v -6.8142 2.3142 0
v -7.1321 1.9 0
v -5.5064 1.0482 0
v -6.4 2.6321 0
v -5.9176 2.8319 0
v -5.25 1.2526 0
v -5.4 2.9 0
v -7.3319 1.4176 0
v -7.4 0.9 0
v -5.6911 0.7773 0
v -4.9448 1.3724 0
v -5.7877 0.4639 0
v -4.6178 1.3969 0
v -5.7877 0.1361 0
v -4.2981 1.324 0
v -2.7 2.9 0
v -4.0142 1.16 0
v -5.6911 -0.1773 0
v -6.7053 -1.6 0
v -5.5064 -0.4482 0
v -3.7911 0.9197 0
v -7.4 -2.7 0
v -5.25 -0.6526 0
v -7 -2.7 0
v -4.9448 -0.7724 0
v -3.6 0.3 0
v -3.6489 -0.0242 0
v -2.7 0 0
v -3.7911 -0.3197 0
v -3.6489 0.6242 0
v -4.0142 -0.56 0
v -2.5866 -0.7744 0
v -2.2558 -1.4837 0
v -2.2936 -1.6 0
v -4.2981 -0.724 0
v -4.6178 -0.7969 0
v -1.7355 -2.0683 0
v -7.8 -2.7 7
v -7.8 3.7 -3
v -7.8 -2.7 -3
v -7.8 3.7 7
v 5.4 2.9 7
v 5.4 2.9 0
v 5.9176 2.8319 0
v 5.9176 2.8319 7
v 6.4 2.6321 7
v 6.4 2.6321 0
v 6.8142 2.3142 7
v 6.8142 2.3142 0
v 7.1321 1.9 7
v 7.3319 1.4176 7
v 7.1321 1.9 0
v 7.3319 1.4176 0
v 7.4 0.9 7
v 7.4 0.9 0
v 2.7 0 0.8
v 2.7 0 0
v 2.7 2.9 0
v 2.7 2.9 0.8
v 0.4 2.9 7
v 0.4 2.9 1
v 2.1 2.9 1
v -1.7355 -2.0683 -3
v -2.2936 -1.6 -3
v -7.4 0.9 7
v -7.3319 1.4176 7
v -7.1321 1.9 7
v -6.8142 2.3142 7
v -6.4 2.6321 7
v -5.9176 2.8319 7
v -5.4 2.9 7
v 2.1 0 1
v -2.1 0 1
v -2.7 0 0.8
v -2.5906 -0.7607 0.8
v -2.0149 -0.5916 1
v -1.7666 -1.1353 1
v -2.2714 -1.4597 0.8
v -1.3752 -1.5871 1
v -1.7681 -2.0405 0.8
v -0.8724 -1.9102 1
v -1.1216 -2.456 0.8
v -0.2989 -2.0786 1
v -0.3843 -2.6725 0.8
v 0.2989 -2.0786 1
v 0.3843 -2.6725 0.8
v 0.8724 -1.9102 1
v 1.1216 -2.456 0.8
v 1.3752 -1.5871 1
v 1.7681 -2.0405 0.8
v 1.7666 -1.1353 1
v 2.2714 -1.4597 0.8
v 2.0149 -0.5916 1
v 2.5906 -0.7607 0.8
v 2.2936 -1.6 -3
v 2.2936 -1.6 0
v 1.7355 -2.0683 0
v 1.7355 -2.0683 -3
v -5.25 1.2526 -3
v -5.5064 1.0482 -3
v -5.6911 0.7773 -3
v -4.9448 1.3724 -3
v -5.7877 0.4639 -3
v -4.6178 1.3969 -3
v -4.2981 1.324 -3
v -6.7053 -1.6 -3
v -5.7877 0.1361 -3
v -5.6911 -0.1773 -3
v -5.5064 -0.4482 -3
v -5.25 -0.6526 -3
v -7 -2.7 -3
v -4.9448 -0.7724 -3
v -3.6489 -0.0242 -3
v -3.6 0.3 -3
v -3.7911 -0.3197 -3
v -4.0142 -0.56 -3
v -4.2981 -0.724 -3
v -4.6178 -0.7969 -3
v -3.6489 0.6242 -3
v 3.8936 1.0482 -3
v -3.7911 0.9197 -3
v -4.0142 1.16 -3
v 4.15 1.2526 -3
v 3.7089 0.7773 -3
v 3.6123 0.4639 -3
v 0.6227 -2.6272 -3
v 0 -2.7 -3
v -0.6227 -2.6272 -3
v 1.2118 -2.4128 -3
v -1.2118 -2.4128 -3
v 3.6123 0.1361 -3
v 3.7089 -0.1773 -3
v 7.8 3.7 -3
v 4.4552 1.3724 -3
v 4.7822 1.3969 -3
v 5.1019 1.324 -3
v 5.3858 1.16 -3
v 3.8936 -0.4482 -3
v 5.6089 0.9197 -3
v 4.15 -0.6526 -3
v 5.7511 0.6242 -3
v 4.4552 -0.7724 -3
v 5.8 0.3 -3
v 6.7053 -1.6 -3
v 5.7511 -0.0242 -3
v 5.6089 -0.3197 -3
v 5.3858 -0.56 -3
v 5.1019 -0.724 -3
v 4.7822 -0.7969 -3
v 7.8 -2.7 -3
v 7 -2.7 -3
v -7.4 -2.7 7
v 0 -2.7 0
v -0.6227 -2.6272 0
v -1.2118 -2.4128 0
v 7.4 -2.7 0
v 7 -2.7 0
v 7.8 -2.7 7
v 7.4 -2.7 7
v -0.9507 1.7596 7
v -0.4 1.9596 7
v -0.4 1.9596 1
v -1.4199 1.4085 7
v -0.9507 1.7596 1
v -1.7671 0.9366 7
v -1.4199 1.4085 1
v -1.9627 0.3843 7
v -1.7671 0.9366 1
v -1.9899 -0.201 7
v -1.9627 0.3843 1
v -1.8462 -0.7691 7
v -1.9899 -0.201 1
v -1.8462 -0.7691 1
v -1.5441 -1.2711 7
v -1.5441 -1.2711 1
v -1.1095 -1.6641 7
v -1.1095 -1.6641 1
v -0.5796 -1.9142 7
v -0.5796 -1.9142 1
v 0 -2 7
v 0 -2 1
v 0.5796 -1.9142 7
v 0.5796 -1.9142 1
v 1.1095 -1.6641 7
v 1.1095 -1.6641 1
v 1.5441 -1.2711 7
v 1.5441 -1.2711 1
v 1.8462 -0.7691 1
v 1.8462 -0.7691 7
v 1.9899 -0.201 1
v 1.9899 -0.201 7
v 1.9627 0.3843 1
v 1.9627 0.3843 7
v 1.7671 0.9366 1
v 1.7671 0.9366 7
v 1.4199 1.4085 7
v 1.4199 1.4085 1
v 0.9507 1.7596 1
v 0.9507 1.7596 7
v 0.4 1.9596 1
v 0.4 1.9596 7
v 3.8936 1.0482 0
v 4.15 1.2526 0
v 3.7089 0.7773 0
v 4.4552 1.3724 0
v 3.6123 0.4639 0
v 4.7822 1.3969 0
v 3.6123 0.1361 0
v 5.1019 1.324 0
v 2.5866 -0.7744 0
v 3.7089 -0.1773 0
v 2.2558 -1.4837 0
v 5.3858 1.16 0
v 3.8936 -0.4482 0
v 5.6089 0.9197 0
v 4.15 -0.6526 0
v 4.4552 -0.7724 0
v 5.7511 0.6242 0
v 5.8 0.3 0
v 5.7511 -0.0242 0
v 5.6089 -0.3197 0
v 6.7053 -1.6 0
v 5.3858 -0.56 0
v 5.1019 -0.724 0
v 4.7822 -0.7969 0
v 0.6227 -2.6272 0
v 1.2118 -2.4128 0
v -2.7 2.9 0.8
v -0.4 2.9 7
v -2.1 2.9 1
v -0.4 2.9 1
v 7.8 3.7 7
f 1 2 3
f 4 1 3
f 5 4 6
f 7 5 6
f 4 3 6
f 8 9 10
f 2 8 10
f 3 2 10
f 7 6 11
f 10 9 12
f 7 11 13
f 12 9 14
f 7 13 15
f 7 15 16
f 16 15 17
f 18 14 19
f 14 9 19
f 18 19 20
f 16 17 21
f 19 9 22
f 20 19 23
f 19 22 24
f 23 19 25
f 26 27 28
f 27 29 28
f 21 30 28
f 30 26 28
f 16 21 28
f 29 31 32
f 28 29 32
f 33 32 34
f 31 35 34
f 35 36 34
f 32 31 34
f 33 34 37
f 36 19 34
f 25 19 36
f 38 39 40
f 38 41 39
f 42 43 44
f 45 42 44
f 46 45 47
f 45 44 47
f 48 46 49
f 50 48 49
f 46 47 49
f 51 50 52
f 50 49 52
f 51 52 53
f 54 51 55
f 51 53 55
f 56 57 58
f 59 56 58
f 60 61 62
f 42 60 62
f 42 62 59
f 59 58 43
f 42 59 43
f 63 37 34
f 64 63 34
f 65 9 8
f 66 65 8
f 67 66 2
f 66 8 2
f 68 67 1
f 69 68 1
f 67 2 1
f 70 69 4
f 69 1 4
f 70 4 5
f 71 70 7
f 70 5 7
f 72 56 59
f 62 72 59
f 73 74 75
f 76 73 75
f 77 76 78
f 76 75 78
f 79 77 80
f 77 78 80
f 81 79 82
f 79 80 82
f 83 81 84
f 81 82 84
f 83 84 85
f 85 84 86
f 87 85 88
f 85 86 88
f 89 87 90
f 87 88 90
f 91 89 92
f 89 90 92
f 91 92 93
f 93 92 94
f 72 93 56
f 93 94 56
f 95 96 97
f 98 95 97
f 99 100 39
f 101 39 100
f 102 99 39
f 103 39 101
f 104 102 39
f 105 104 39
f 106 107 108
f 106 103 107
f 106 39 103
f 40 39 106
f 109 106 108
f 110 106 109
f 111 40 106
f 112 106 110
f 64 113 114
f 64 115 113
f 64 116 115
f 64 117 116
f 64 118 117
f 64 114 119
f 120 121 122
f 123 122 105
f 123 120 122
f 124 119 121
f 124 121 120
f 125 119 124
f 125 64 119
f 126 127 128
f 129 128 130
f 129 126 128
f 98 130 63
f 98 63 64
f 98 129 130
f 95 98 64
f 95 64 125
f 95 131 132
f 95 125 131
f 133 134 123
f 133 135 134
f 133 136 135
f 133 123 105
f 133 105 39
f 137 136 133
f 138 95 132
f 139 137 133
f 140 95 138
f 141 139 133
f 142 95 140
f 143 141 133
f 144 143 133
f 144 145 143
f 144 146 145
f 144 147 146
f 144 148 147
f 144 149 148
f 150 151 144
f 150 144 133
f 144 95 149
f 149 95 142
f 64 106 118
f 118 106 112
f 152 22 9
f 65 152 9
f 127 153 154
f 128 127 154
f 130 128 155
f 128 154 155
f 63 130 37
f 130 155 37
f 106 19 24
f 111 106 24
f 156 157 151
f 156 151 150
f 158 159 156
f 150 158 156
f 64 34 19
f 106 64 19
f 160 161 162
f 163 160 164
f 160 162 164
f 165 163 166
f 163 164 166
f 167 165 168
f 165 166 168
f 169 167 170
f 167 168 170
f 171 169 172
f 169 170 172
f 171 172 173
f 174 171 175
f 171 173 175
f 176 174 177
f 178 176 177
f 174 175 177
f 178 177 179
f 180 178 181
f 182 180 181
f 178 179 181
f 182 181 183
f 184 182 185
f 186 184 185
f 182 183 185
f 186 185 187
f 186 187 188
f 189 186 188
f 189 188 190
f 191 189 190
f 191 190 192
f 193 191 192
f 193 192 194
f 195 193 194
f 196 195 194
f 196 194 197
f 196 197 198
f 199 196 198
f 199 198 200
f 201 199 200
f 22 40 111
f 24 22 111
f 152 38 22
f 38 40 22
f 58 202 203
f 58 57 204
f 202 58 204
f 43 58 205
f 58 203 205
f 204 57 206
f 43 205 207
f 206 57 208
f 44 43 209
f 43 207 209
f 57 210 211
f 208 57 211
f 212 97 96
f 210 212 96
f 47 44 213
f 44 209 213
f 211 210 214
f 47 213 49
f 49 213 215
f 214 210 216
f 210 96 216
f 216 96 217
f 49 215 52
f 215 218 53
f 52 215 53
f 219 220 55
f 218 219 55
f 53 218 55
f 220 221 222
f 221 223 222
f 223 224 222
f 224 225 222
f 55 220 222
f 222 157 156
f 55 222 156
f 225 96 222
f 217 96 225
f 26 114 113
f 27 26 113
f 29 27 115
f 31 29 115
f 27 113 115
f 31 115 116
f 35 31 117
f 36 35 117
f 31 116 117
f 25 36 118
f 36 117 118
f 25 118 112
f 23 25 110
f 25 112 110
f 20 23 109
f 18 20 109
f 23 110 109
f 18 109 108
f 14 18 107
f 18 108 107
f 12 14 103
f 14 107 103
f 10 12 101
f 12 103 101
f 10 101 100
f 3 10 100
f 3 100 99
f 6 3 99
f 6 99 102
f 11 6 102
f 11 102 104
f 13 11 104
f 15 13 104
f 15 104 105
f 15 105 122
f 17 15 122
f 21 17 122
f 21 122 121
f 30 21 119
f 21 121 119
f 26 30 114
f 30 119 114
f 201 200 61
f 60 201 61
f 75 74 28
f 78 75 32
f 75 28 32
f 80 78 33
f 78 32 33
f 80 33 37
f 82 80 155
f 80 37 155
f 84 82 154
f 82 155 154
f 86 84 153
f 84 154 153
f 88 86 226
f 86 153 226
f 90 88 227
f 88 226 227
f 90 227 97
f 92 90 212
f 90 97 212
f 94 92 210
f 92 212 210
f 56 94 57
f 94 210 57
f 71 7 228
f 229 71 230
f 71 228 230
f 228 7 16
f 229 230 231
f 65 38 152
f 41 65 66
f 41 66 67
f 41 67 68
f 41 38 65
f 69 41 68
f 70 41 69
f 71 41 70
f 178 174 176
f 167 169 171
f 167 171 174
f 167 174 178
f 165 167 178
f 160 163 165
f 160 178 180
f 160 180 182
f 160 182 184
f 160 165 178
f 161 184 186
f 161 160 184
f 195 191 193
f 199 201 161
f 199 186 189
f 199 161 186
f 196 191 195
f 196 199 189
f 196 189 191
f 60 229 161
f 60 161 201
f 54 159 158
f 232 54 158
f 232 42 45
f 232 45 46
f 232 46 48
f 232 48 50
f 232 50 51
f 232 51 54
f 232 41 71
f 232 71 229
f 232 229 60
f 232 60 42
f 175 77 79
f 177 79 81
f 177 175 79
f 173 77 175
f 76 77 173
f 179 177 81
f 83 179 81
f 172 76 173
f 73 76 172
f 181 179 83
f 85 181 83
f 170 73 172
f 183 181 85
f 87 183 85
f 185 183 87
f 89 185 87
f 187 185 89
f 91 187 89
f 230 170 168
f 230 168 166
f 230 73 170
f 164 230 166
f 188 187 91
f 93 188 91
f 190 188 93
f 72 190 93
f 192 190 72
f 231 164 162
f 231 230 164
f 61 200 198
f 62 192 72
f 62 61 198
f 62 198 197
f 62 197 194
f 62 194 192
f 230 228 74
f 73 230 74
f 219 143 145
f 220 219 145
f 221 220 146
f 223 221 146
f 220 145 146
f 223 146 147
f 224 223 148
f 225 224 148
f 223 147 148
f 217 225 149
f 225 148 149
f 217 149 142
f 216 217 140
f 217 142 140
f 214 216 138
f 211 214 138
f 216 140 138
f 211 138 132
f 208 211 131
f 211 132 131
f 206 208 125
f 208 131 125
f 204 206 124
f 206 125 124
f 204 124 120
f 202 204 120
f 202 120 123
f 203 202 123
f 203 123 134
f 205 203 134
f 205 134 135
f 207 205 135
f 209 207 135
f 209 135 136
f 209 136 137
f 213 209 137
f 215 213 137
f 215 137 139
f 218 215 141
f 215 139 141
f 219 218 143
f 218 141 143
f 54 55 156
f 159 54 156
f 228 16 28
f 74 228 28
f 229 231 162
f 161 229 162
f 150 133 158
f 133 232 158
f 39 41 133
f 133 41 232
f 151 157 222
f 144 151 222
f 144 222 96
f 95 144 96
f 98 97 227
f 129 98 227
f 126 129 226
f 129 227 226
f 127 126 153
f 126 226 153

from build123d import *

# Parameters (mm, degrees)
F1_DEPTH  = 7
F2_W      = 15.6
F2_H      = 6.4
F3_DEPTH  = 3
F5_DEPTH  = 1
F6_SIZE2  = 0.2
F6_SIZE   = 0.6
F8_DEPTH  = 3
F9_R      = 1.1
F10_DEPTH = 3


with BuildPart() as f1:
    # F0 (on Top) → F1 (new body)
    with BuildSketch(Plane.XY):
        with BuildLine():
            Line((-0.4, 2.9), (-0.4, 1.9595917942))
            ThreePointArc((-0.4, 1.9595917942), (0, -2), (0.4, 1.9595917942))
            Line((0.4, 1.9595917942), (0.4, 2.9))
            Line((0.4, 2.9), (5.4, 2.9))
            ThreePointArc((5.4, 2.9), (6.8142135624, 2.3142135624), (7.4, 0.9))
            Line((7.4, 0.9), (7.4, -2.7))
            Line((7.4, -2.7), (7.8, -2.7))
            Line((7.8, -2.7), (7.8, 3.7))
            Line((7.8, 3.7), (-7.8, 3.7))
            Line((-7.8, 3.7), (-7.8, -2.7))
            Line((-7.8, -2.7), (-7.4, -2.7))
            Line((-7.4, -2.7), (-7.4, 0.9))
            ThreePointArc((-7.4, 0.9), (-6.8142135624, 2.3142135624), (-5.4, 2.9))
            Line((-5.4, 2.9), (-0.4, 2.9))
        make_face()
    extrude(amount=F1_DEPTH)

    # F2 (on face) → F3 (join)
    with BuildSketch(Plane(origin=(0, 0, 0), x_dir=(1, 0, 0), z_dir=(0, 0, -1))):
        with Locations((0, -0.5)):
            Rectangle(F2_W, F2_H)
    extrude(amount=F3_DEPTH)

    # F4 (on face) → F5 (join)
    with BuildSketch(Plane.XY):
        with BuildLine():
            Line((-2.7, 2.9), (-2.7, 0))
            ThreePointArc((-2.7, 0), (0, -2.7), (2.7, 0))
            Line((2.7, 0), (2.7, 2.9))
            Line((2.7, 2.9), (-2.7, 2.9))
        make_face()
    extrude(amount=F5_DEPTH)

    # F6
    f6_edges = [f1.edges().sort_by_distance(p)[0] for p in [
        (0, -2.7, 1),
    ]]
    f6_side = f1.faces().sort_by_distance((0, -2.622205, 1))[0]
    chamfer(f6_edges, length=F6_SIZE, length2=F6_SIZE2, reference=f6_side)

    # F7 (on face) → F8 (cut, through all)
    with BuildSketch(Plane.XY):
        with BuildLine():
            ThreePointArc((0, -2.7), (-0.923454387, -2.5371700761), (-1.7355265462, -2.0683199964))
            Line((-1.7355265462, -2.0683199964), (-2.2936485844, -1.6))
            Line((-2.2936485844, -1.6), (-6.7052558883, -1.6))
            Line((-6.7052558883, -1.6), (-7, -2.7))
            Line((-7, -2.7), (0, -2.7))
        make_face()
        with BuildLine():
            ThreePointArc((1.7355265462, -2.0683199964), (0.923454387, -2.5371700761), (0, -2.7))
            Line((0, -2.7), (7, -2.7))
            Line((7, -2.7), (6.7052558883, -1.6))
            Line((6.7052558883, -1.6), (2.2936485844, -1.6))
            Line((2.2936485844, -1.6), (1.7355265462, -2.0683199964))
        make_face()
    extrude(amount=-F8_DEPTH, mode=Mode.SUBTRACT)

    # F9 (on face) → F10 (cut, through all)
    with BuildSketch(Plane(origin=(0, 0, -3), x_dir=(1, 0, 0), z_dir=(0, 0, -1))):
        with Locations((-4.7, -0.3)):
            Circle(F9_R)
        with Locations((4.7, -0.3)):
            Circle(F9_R)
    extrude(amount=-F10_DEPTH, mode=Mode.SUBTRACT)


solid = f1.part
